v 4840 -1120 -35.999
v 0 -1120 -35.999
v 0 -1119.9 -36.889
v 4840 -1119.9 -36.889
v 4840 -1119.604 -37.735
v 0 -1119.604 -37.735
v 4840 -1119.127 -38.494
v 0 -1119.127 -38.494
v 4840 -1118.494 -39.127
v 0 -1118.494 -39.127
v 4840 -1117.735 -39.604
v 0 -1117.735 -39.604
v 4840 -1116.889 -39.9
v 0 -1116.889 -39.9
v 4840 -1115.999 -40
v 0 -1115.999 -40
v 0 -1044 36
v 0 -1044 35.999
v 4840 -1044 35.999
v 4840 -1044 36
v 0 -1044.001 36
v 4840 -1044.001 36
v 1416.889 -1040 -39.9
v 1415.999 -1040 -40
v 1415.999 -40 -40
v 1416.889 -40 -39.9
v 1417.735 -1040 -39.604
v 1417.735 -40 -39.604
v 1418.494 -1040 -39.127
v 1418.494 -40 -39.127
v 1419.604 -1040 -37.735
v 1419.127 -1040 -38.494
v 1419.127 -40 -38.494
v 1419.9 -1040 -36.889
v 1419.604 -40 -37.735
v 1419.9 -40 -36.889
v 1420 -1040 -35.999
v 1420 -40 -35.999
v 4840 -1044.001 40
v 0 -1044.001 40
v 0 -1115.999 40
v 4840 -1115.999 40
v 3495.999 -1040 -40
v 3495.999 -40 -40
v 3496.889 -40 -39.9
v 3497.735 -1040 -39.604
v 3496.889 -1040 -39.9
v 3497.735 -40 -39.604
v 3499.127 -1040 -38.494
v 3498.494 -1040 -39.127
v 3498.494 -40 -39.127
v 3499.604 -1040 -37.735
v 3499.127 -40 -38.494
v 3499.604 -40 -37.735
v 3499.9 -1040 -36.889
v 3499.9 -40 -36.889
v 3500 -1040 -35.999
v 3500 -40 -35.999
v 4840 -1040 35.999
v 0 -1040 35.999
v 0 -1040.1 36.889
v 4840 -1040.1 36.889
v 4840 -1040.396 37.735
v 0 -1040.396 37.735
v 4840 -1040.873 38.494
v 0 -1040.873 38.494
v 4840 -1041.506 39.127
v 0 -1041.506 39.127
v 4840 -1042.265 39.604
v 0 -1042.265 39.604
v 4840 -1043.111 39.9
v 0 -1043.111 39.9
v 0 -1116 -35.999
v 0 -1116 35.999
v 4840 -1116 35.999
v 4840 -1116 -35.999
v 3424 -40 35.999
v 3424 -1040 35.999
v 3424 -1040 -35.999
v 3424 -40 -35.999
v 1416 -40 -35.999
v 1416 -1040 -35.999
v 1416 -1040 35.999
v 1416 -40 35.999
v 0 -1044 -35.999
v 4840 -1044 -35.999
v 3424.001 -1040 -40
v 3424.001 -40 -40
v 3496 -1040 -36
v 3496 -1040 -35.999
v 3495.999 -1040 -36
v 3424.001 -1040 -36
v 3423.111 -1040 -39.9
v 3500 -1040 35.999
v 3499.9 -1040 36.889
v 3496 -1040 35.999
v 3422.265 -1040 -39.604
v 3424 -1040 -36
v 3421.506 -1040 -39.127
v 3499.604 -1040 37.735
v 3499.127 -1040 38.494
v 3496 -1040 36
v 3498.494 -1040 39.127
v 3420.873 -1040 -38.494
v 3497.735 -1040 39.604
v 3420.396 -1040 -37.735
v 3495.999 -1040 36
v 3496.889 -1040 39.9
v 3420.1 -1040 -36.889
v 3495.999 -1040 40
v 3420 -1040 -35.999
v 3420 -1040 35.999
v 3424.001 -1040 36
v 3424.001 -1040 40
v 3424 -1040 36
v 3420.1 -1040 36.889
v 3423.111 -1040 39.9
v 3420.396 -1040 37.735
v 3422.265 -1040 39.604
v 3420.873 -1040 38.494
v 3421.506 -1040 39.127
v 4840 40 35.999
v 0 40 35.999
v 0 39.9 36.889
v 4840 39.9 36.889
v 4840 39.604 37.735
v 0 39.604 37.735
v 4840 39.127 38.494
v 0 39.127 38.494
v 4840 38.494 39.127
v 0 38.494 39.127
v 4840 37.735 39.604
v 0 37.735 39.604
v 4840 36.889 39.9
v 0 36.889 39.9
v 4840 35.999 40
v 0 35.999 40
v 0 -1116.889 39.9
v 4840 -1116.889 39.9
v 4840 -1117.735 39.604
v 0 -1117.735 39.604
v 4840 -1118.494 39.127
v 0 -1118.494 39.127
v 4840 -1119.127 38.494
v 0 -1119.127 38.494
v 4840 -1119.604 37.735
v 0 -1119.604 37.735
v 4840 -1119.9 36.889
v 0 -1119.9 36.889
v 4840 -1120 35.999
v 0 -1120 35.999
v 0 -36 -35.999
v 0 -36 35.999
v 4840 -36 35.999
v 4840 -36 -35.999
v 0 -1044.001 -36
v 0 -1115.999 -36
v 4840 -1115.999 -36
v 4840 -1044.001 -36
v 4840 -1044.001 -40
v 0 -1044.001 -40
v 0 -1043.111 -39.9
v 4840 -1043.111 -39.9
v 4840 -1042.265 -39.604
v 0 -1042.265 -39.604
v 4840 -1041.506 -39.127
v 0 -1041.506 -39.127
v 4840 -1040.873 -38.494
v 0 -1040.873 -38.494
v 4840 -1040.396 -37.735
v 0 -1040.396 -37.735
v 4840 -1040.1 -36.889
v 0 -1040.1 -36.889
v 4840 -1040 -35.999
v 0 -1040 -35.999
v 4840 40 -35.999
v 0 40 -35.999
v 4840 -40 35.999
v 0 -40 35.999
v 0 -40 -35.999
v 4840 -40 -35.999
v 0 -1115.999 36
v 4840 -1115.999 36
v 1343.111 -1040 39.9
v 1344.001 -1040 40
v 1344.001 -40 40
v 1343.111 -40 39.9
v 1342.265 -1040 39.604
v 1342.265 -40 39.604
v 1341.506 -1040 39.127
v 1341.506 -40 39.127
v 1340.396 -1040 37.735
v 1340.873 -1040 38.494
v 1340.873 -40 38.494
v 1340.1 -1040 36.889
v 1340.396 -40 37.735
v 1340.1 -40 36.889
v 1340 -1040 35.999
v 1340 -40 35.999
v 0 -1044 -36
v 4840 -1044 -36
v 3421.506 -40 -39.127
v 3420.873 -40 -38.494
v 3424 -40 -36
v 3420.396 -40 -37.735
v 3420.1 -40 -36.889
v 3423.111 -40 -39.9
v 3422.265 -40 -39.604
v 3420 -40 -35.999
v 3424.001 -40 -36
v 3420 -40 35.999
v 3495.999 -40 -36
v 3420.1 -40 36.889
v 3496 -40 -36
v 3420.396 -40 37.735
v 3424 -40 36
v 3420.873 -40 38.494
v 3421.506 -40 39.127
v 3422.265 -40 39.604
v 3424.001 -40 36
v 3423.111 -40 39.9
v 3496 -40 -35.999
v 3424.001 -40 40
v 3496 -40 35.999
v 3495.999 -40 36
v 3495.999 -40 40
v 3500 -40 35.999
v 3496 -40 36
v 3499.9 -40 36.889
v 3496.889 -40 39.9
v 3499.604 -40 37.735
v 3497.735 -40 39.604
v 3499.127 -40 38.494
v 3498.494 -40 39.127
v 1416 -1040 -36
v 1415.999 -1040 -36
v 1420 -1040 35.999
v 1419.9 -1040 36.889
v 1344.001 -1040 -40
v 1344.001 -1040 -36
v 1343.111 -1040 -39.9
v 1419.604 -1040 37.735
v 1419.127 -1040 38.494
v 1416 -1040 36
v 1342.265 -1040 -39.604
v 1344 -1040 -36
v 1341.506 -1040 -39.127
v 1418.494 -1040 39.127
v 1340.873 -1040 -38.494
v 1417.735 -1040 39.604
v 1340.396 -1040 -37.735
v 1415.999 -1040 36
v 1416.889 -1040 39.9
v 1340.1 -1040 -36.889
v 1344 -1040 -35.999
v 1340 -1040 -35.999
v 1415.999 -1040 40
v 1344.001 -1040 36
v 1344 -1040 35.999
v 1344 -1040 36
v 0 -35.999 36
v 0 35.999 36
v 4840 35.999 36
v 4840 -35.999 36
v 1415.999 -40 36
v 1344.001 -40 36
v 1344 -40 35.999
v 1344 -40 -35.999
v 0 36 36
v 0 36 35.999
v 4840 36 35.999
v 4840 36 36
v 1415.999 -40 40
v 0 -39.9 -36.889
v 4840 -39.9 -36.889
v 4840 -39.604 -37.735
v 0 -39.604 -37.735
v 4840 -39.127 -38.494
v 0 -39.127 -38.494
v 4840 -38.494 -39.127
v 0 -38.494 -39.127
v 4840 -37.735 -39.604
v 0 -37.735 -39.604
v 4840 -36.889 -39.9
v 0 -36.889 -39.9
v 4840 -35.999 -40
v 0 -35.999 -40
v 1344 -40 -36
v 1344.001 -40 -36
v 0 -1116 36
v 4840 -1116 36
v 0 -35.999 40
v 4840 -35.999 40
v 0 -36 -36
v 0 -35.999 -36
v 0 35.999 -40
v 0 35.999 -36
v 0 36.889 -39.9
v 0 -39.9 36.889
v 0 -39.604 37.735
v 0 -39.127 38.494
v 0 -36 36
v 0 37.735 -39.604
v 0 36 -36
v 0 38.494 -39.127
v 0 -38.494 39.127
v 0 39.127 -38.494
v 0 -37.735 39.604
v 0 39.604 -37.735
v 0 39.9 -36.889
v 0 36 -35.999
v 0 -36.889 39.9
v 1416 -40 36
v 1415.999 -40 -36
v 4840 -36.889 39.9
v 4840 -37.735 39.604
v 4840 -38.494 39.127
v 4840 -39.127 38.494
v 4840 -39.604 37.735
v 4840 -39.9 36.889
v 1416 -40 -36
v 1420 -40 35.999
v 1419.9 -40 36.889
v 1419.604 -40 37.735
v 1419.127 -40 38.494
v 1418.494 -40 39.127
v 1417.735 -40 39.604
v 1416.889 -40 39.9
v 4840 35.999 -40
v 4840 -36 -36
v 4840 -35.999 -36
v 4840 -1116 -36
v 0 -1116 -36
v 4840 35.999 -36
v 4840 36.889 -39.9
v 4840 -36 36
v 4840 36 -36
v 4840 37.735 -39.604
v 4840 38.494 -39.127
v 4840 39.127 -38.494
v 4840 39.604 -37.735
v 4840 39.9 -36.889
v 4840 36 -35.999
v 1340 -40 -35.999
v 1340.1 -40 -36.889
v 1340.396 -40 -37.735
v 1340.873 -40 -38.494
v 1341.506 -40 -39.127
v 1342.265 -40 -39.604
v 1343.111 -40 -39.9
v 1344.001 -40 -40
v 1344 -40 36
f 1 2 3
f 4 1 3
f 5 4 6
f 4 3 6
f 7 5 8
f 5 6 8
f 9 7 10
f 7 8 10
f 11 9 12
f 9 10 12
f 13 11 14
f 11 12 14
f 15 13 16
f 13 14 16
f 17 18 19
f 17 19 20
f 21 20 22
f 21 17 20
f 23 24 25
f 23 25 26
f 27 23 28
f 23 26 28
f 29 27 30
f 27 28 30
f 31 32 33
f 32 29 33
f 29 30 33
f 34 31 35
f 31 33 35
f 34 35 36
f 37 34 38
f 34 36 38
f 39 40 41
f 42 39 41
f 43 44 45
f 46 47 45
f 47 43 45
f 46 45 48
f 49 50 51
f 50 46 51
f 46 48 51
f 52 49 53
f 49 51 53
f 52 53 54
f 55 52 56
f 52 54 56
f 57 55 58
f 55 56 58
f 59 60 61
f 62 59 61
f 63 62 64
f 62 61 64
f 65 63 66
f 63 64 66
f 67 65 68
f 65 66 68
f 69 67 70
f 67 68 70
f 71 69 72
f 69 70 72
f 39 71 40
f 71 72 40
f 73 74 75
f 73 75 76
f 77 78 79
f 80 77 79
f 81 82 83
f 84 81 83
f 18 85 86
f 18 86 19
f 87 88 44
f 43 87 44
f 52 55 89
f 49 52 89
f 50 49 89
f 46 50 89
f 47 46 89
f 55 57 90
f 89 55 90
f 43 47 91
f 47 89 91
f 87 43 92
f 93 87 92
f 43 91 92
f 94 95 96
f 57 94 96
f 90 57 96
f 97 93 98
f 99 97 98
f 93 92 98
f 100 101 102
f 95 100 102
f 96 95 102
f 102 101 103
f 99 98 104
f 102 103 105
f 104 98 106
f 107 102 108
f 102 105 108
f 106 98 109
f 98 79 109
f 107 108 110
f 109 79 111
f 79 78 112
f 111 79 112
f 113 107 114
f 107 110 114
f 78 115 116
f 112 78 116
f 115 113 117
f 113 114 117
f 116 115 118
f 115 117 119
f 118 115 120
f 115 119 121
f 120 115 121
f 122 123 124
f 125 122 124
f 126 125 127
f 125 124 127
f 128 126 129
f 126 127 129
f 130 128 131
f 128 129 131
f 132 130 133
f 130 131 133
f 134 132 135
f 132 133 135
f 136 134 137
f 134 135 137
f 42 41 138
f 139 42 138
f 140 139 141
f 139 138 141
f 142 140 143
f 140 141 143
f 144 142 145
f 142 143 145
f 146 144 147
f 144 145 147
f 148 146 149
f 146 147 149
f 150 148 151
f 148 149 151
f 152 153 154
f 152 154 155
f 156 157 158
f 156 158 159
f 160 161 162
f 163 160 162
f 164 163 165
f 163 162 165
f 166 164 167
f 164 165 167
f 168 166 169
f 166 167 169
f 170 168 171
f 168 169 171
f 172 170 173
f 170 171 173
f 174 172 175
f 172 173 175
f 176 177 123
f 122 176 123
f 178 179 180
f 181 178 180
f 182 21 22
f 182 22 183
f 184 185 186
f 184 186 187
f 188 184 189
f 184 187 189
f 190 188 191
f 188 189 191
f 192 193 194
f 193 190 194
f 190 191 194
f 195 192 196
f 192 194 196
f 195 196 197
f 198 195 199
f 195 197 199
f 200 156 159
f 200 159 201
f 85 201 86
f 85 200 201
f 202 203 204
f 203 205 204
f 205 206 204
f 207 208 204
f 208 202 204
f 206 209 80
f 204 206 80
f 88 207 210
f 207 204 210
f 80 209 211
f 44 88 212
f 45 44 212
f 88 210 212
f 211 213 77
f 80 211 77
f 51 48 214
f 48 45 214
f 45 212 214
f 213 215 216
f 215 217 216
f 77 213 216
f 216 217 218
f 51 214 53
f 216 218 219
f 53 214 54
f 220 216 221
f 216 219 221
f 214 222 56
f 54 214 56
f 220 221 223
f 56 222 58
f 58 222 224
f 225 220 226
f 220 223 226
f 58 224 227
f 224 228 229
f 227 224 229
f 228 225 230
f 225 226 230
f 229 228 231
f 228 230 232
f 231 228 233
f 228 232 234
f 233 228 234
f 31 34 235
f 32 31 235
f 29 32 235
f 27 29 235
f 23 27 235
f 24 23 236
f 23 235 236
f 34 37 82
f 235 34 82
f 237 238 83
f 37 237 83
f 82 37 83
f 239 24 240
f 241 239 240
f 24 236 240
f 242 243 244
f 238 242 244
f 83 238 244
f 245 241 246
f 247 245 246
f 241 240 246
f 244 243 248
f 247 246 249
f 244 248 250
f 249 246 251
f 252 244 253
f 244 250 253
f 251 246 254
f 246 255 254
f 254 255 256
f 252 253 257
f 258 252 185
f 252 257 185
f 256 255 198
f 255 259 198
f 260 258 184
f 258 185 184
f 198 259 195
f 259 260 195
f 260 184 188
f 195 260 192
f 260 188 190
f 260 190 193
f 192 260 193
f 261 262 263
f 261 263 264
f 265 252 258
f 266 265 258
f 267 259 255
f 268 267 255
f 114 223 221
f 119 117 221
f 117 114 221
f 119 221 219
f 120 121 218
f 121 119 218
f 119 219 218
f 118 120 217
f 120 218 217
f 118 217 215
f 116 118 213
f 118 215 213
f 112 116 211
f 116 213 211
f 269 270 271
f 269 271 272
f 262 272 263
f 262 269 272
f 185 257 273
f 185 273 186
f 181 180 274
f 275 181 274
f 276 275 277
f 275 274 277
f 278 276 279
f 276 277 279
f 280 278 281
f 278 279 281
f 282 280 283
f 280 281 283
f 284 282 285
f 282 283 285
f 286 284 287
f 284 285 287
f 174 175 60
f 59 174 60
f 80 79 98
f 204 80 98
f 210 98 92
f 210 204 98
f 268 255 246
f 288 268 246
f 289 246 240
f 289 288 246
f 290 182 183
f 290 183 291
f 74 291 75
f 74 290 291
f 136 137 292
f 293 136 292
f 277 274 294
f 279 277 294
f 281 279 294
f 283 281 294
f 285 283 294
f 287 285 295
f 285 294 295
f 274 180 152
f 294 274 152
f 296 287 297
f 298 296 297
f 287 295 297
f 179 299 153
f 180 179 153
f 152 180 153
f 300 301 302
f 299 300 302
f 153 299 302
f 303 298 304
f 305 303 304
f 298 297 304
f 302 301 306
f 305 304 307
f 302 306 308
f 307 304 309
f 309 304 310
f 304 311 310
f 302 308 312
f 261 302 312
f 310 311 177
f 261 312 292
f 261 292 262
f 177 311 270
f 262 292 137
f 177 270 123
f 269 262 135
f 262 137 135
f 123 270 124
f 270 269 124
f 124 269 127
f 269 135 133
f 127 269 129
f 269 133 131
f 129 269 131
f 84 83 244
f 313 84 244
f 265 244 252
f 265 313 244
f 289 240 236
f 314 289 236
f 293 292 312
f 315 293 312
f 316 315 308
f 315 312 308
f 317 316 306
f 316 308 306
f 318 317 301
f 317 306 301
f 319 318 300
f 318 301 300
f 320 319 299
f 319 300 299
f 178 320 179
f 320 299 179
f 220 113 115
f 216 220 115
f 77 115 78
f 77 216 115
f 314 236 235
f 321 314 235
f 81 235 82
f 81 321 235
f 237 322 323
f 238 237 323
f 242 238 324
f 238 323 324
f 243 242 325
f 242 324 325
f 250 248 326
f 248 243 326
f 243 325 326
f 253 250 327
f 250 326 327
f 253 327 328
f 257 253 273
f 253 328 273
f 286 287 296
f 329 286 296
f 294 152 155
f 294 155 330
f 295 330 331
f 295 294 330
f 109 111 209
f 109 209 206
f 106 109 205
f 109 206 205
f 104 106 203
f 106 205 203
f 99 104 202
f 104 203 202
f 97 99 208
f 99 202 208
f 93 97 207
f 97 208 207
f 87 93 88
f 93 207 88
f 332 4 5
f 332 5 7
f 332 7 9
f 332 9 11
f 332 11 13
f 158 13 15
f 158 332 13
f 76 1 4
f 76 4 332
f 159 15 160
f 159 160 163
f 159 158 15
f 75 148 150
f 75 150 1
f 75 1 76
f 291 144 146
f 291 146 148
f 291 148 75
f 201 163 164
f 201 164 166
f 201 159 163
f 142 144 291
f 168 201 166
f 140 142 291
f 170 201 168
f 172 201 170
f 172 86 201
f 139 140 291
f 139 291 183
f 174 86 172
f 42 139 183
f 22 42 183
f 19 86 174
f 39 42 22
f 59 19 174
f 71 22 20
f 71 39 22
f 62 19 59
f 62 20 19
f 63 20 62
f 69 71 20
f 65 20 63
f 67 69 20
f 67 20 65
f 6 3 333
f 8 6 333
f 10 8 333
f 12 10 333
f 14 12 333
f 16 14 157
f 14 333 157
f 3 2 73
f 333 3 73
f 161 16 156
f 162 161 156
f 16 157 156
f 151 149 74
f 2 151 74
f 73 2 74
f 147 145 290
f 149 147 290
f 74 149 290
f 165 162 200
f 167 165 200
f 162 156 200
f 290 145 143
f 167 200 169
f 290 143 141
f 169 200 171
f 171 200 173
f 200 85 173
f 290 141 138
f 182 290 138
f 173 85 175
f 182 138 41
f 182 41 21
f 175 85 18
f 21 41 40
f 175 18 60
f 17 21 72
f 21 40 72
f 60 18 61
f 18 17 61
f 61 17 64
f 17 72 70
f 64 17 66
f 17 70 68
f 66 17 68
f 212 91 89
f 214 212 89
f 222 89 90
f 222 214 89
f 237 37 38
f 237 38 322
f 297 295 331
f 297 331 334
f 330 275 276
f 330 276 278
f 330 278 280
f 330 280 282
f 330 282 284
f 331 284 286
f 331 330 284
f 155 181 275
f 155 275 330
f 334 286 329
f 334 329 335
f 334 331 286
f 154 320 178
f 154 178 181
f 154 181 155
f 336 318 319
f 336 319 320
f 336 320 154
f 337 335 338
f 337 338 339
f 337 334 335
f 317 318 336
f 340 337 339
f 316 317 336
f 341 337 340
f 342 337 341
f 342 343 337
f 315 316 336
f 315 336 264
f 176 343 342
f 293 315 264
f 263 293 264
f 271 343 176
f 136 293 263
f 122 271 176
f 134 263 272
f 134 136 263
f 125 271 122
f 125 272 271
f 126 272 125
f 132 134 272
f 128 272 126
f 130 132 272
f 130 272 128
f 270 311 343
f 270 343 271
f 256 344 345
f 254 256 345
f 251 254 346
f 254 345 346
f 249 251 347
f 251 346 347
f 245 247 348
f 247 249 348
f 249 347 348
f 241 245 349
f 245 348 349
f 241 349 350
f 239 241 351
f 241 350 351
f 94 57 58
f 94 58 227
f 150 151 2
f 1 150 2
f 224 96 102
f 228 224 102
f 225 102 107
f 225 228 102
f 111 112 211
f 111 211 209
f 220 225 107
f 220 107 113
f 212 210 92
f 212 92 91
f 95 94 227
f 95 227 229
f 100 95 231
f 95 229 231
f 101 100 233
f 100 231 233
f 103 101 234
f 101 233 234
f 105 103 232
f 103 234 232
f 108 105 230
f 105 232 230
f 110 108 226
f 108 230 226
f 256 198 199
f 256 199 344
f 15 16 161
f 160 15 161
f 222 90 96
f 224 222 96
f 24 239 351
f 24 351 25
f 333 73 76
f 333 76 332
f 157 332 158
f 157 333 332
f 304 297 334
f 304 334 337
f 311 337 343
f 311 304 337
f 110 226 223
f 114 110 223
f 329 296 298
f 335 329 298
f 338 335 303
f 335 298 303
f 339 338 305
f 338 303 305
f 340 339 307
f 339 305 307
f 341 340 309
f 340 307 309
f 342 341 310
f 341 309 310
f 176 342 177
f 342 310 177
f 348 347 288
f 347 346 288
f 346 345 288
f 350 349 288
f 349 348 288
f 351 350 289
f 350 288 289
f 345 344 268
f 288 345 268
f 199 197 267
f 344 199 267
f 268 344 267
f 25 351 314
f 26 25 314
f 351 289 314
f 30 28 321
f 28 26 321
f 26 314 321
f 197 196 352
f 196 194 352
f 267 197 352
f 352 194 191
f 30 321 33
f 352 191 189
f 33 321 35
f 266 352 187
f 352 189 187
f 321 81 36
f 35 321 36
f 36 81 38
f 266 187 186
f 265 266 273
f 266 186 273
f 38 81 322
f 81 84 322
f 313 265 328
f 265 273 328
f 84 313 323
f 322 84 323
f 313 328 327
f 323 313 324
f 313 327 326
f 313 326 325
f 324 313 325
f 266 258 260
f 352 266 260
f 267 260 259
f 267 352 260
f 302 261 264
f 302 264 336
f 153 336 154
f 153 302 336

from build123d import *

# Parameters (mm, degrees)
F_8639_82_80_X_80_X_4_0_1_DEPTH   = 4840
F_8639_82_80_X_80_X_4_0_1_2_DEPTH = 4840
F_8639_82_80_X_80_X_4_0_1_3_DEPTH = 1082
F_8639_82_80_X_80_X_4_0_1_4_DEPTH = 1082


with BuildPart() as part:
    # Sketch1 → Квадратная труба гост 8639-82 _80 X 80 X 4.0(1) (new body)
    with BuildSketch(Plane.YZ):
        with BuildLine():
            Line((-35.999, -40), (35.999, -40))
            ThreePointArc((35.999, -40), (38.828134232, -38.828134232), (40, -35.999))
            Line((40, -35.999), (40, 35.999))
            ThreePointArc((40, 35.999), (38.828134232, 38.828134232), (35.999, 40))
            Line((35.999, 40), (-35.999, 40))
            ThreePointArc((-35.999, 40), (-38.828134232, 38.828134232), (-40, 35.999))
            Line((-40, 35.999), (-40, -35.999))
            ThreePointArc((-40, -35.999), (-38.828134232, -38.828134232), (-35.999, -40))
        make_face()
        with BuildLine():
            Line((-35.999, -36), (35.999, -36))
            ThreePointArc((35.999, -36), (35.999707107, -35.999707107), (36, -35.999))
            Line((36, -35.999), (36, 35.999))
            ThreePointArc((36, 35.999), (35.999707107, 35.999707107), (35.999, 36))
            Line((35.999, 36), (-35.999, 36))
            ThreePointArc((-35.999, 36), (-35.999707107, 35.999707107), (-36, 35.999))
            Line((-36, 35.999), (-36, -35.999))
            ThreePointArc((-36, -35.999), (-35.999707107, -35.999707107), (-35.999, -36))
        make_face(mode=Mode.SUBTRACT)
    extrude(amount=F_8639_82_80_X_80_X_4_0_1_DEPTH)


with BuildPart() as body_2:
    # Sketch1 on segment 2 (carried to segment 2) → 8639-82 _80 X 80 X 4.0_1 2 (new body)
    with BuildSketch(Plane(origin=(0, -1080, 0), x_dir=(0, 1, 0), z_dir=(1, 0, 0))):
        with BuildLine():
            Line((-35.999, -40), (35.999, -40))
            ThreePointArc((35.999, -40), (38.828134232, -38.828134232), (40, -35.999))
            Line((40, -35.999), (40, 35.999))
            ThreePointArc((40, 35.999), (38.828134232, 38.828134232), (35.999, 40))
            Line((35.999, 40), (-35.999, 40))
            ThreePointArc((-35.999, 40), (-38.828134232, 38.828134232), (-40, 35.999))
            Line((-40, 35.999), (-40, -35.999))
            ThreePointArc((-40, -35.999), (-38.828134232, -38.828134232), (-35.999, -40))
        make_face()
        with BuildLine():
            Line((-35.999, -36), (35.999, -36))
            ThreePointArc((35.999, -36), (35.999707107, -35.999707107), (36, -35.999))
            Line((36, -35.999), (36, 35.999))
            ThreePointArc((36, 35.999), (35.999707107, 35.999707107), (35.999, 36))
            Line((35.999, 36), (-35.999, 36))
            ThreePointArc((-35.999, 36), (-35.999707107, 35.999707107), (-36, 35.999))
            Line((-36, 35.999), (-36, -35.999))
            ThreePointArc((-36, -35.999), (-35.999707107, -35.999707107), (-35.999, -36))
        make_face(mode=Mode.SUBTRACT)
    extrude(amount=F_8639_82_80_X_80_X_4_0_1_2_DEPTH)


with BuildPart() as body_3:
    # Sketch1 on segment 3 (carried to segment 3) → 8639-82 _80 X 80 X 4.0_1 3 (new body)
    with BuildSketch(Plane(origin=(1380, 1, 0), x_dir=(1, 0, 0), z_dir=(0, -1, 0))):
        with BuildLine():
            Line((-35.999, -40), (35.999, -40))
            ThreePointArc((35.999, -40), (38.828134232, -38.828134232), (40, -35.999))
            Line((40, -35.999), (40, 35.999))
            ThreePointArc((40, 35.999), (38.828134232, 38.828134232), (35.999, 40))
            Line((35.999, 40), (-35.999, 40))
            ThreePointArc((-35.999, 40), (-38.828134232, 38.828134232), (-40, 35.999))
            Line((-40, 35.999), (-40, -35.999))
            ThreePointArc((-40, -35.999), (-38.828134232, -38.828134232), (-35.999, -40))
        make_face()
        with BuildLine():
            Line((-35.999, -36), (35.999, -36))
            ThreePointArc((35.999, -36), (35.999707107, -35.999707107), (36, -35.999))
            Line((36, -35.999), (36, 35.999))
            ThreePointArc((36, 35.999), (35.999707107, 35.999707107), (35.999, 36))
            Line((35.999, 36), (-35.999, 36))
            ThreePointArc((-35.999, 36), (-35.999707107, 35.999707107), (-36, 35.999))
            Line((-36, 35.999), (-36, -35.999))
            ThreePointArc((-36, -35.999), (-35.999707107, -35.999707107), (-35.999, -36))
        make_face(mode=Mode.SUBTRACT)
    extrude(amount=F_8639_82_80_X_80_X_4_0_1_3_DEPTH)

    # 8639-82 _80 X 80 X 4.0_1 3 end butt 1
    split(bisect_by=Plane(origin=(1380, -40, 0), x_dir=(1, 0, 0), z_dir=(0, -1, 0)), keep=Keep.TOP)

    # 8639-82 _80 X 80 X 4.0_1 3 end butt 2
    split(bisect_by=Plane(origin=(1380, -1040, 0), x_dir=(-1, 0, 0), z_dir=(0, 1, 0)), keep=Keep.TOP)


with BuildPart() as body_4:
    # Sketch1 on segment 4 (carried to segment 4) → 8639-82 _80 X 80 X 4.0_1 4 (new body)
    with BuildSketch(Plane(origin=(3460, 1, 0), x_dir=(1, 0, 0), z_dir=(0, -1, 0))):
        with BuildLine():
            Line((-35.999, -40), (35.999, -40))
            ThreePointArc((35.999, -40), (38.828134232, -38.828134232), (40, -35.999))
            Line((40, -35.999), (40, 35.999))
            ThreePointArc((40, 35.999), (38.828134232, 38.828134232), (35.999, 40))
            Line((35.999, 40), (-35.999, 40))
            ThreePointArc((-35.999, 40), (-38.828134232, 38.828134232), (-40, 35.999))
            Line((-40, 35.999), (-40, -35.999))
            ThreePointArc((-40, -35.999), (-38.828134232, -38.828134232), (-35.999, -40))
        make_face()
        with BuildLine():
            Line((-35.999, -36), (35.999, -36))
            ThreePointArc((35.999, -36), (35.999707107, -35.999707107), (36, -35.999))
            Line((36, -35.999), (36, 35.999))
            ThreePointArc((36, 35.999), (35.999707107, 35.999707107), (35.999, 36))
            Line((35.999, 36), (-35.999, 36))
            ThreePointArc((-35.999, 36), (-35.999707107, 35.999707107), (-36, 35.999))
            Line((-36, 35.999), (-36, -35.999))
            ThreePointArc((-36, -35.999), (-35.999707107, -35.999707107), (-35.999, -36))
        make_face(mode=Mode.SUBTRACT)
    extrude(amount=F_8639_82_80_X_80_X_4_0_1_4_DEPTH)

    # 8639-82 _80 X 80 X 4.0_1 4 end butt 1
    split(bisect_by=Plane(origin=(3460, -40, 0), x_dir=(1, 0, 0), z_dir=(0, -1, 0)), keep=Keep.TOP)

    # 8639-82 _80 X 80 X 4.0_1 4 end butt 2
    split(bisect_by=Plane(origin=(3460, -1040, 0), x_dir=(-1, 0, 0), z_dir=(0, 1, 0)), keep=Keep.TOP)


solid = Compound([part.part, body_2.part, body_3.part, body_4.part])
